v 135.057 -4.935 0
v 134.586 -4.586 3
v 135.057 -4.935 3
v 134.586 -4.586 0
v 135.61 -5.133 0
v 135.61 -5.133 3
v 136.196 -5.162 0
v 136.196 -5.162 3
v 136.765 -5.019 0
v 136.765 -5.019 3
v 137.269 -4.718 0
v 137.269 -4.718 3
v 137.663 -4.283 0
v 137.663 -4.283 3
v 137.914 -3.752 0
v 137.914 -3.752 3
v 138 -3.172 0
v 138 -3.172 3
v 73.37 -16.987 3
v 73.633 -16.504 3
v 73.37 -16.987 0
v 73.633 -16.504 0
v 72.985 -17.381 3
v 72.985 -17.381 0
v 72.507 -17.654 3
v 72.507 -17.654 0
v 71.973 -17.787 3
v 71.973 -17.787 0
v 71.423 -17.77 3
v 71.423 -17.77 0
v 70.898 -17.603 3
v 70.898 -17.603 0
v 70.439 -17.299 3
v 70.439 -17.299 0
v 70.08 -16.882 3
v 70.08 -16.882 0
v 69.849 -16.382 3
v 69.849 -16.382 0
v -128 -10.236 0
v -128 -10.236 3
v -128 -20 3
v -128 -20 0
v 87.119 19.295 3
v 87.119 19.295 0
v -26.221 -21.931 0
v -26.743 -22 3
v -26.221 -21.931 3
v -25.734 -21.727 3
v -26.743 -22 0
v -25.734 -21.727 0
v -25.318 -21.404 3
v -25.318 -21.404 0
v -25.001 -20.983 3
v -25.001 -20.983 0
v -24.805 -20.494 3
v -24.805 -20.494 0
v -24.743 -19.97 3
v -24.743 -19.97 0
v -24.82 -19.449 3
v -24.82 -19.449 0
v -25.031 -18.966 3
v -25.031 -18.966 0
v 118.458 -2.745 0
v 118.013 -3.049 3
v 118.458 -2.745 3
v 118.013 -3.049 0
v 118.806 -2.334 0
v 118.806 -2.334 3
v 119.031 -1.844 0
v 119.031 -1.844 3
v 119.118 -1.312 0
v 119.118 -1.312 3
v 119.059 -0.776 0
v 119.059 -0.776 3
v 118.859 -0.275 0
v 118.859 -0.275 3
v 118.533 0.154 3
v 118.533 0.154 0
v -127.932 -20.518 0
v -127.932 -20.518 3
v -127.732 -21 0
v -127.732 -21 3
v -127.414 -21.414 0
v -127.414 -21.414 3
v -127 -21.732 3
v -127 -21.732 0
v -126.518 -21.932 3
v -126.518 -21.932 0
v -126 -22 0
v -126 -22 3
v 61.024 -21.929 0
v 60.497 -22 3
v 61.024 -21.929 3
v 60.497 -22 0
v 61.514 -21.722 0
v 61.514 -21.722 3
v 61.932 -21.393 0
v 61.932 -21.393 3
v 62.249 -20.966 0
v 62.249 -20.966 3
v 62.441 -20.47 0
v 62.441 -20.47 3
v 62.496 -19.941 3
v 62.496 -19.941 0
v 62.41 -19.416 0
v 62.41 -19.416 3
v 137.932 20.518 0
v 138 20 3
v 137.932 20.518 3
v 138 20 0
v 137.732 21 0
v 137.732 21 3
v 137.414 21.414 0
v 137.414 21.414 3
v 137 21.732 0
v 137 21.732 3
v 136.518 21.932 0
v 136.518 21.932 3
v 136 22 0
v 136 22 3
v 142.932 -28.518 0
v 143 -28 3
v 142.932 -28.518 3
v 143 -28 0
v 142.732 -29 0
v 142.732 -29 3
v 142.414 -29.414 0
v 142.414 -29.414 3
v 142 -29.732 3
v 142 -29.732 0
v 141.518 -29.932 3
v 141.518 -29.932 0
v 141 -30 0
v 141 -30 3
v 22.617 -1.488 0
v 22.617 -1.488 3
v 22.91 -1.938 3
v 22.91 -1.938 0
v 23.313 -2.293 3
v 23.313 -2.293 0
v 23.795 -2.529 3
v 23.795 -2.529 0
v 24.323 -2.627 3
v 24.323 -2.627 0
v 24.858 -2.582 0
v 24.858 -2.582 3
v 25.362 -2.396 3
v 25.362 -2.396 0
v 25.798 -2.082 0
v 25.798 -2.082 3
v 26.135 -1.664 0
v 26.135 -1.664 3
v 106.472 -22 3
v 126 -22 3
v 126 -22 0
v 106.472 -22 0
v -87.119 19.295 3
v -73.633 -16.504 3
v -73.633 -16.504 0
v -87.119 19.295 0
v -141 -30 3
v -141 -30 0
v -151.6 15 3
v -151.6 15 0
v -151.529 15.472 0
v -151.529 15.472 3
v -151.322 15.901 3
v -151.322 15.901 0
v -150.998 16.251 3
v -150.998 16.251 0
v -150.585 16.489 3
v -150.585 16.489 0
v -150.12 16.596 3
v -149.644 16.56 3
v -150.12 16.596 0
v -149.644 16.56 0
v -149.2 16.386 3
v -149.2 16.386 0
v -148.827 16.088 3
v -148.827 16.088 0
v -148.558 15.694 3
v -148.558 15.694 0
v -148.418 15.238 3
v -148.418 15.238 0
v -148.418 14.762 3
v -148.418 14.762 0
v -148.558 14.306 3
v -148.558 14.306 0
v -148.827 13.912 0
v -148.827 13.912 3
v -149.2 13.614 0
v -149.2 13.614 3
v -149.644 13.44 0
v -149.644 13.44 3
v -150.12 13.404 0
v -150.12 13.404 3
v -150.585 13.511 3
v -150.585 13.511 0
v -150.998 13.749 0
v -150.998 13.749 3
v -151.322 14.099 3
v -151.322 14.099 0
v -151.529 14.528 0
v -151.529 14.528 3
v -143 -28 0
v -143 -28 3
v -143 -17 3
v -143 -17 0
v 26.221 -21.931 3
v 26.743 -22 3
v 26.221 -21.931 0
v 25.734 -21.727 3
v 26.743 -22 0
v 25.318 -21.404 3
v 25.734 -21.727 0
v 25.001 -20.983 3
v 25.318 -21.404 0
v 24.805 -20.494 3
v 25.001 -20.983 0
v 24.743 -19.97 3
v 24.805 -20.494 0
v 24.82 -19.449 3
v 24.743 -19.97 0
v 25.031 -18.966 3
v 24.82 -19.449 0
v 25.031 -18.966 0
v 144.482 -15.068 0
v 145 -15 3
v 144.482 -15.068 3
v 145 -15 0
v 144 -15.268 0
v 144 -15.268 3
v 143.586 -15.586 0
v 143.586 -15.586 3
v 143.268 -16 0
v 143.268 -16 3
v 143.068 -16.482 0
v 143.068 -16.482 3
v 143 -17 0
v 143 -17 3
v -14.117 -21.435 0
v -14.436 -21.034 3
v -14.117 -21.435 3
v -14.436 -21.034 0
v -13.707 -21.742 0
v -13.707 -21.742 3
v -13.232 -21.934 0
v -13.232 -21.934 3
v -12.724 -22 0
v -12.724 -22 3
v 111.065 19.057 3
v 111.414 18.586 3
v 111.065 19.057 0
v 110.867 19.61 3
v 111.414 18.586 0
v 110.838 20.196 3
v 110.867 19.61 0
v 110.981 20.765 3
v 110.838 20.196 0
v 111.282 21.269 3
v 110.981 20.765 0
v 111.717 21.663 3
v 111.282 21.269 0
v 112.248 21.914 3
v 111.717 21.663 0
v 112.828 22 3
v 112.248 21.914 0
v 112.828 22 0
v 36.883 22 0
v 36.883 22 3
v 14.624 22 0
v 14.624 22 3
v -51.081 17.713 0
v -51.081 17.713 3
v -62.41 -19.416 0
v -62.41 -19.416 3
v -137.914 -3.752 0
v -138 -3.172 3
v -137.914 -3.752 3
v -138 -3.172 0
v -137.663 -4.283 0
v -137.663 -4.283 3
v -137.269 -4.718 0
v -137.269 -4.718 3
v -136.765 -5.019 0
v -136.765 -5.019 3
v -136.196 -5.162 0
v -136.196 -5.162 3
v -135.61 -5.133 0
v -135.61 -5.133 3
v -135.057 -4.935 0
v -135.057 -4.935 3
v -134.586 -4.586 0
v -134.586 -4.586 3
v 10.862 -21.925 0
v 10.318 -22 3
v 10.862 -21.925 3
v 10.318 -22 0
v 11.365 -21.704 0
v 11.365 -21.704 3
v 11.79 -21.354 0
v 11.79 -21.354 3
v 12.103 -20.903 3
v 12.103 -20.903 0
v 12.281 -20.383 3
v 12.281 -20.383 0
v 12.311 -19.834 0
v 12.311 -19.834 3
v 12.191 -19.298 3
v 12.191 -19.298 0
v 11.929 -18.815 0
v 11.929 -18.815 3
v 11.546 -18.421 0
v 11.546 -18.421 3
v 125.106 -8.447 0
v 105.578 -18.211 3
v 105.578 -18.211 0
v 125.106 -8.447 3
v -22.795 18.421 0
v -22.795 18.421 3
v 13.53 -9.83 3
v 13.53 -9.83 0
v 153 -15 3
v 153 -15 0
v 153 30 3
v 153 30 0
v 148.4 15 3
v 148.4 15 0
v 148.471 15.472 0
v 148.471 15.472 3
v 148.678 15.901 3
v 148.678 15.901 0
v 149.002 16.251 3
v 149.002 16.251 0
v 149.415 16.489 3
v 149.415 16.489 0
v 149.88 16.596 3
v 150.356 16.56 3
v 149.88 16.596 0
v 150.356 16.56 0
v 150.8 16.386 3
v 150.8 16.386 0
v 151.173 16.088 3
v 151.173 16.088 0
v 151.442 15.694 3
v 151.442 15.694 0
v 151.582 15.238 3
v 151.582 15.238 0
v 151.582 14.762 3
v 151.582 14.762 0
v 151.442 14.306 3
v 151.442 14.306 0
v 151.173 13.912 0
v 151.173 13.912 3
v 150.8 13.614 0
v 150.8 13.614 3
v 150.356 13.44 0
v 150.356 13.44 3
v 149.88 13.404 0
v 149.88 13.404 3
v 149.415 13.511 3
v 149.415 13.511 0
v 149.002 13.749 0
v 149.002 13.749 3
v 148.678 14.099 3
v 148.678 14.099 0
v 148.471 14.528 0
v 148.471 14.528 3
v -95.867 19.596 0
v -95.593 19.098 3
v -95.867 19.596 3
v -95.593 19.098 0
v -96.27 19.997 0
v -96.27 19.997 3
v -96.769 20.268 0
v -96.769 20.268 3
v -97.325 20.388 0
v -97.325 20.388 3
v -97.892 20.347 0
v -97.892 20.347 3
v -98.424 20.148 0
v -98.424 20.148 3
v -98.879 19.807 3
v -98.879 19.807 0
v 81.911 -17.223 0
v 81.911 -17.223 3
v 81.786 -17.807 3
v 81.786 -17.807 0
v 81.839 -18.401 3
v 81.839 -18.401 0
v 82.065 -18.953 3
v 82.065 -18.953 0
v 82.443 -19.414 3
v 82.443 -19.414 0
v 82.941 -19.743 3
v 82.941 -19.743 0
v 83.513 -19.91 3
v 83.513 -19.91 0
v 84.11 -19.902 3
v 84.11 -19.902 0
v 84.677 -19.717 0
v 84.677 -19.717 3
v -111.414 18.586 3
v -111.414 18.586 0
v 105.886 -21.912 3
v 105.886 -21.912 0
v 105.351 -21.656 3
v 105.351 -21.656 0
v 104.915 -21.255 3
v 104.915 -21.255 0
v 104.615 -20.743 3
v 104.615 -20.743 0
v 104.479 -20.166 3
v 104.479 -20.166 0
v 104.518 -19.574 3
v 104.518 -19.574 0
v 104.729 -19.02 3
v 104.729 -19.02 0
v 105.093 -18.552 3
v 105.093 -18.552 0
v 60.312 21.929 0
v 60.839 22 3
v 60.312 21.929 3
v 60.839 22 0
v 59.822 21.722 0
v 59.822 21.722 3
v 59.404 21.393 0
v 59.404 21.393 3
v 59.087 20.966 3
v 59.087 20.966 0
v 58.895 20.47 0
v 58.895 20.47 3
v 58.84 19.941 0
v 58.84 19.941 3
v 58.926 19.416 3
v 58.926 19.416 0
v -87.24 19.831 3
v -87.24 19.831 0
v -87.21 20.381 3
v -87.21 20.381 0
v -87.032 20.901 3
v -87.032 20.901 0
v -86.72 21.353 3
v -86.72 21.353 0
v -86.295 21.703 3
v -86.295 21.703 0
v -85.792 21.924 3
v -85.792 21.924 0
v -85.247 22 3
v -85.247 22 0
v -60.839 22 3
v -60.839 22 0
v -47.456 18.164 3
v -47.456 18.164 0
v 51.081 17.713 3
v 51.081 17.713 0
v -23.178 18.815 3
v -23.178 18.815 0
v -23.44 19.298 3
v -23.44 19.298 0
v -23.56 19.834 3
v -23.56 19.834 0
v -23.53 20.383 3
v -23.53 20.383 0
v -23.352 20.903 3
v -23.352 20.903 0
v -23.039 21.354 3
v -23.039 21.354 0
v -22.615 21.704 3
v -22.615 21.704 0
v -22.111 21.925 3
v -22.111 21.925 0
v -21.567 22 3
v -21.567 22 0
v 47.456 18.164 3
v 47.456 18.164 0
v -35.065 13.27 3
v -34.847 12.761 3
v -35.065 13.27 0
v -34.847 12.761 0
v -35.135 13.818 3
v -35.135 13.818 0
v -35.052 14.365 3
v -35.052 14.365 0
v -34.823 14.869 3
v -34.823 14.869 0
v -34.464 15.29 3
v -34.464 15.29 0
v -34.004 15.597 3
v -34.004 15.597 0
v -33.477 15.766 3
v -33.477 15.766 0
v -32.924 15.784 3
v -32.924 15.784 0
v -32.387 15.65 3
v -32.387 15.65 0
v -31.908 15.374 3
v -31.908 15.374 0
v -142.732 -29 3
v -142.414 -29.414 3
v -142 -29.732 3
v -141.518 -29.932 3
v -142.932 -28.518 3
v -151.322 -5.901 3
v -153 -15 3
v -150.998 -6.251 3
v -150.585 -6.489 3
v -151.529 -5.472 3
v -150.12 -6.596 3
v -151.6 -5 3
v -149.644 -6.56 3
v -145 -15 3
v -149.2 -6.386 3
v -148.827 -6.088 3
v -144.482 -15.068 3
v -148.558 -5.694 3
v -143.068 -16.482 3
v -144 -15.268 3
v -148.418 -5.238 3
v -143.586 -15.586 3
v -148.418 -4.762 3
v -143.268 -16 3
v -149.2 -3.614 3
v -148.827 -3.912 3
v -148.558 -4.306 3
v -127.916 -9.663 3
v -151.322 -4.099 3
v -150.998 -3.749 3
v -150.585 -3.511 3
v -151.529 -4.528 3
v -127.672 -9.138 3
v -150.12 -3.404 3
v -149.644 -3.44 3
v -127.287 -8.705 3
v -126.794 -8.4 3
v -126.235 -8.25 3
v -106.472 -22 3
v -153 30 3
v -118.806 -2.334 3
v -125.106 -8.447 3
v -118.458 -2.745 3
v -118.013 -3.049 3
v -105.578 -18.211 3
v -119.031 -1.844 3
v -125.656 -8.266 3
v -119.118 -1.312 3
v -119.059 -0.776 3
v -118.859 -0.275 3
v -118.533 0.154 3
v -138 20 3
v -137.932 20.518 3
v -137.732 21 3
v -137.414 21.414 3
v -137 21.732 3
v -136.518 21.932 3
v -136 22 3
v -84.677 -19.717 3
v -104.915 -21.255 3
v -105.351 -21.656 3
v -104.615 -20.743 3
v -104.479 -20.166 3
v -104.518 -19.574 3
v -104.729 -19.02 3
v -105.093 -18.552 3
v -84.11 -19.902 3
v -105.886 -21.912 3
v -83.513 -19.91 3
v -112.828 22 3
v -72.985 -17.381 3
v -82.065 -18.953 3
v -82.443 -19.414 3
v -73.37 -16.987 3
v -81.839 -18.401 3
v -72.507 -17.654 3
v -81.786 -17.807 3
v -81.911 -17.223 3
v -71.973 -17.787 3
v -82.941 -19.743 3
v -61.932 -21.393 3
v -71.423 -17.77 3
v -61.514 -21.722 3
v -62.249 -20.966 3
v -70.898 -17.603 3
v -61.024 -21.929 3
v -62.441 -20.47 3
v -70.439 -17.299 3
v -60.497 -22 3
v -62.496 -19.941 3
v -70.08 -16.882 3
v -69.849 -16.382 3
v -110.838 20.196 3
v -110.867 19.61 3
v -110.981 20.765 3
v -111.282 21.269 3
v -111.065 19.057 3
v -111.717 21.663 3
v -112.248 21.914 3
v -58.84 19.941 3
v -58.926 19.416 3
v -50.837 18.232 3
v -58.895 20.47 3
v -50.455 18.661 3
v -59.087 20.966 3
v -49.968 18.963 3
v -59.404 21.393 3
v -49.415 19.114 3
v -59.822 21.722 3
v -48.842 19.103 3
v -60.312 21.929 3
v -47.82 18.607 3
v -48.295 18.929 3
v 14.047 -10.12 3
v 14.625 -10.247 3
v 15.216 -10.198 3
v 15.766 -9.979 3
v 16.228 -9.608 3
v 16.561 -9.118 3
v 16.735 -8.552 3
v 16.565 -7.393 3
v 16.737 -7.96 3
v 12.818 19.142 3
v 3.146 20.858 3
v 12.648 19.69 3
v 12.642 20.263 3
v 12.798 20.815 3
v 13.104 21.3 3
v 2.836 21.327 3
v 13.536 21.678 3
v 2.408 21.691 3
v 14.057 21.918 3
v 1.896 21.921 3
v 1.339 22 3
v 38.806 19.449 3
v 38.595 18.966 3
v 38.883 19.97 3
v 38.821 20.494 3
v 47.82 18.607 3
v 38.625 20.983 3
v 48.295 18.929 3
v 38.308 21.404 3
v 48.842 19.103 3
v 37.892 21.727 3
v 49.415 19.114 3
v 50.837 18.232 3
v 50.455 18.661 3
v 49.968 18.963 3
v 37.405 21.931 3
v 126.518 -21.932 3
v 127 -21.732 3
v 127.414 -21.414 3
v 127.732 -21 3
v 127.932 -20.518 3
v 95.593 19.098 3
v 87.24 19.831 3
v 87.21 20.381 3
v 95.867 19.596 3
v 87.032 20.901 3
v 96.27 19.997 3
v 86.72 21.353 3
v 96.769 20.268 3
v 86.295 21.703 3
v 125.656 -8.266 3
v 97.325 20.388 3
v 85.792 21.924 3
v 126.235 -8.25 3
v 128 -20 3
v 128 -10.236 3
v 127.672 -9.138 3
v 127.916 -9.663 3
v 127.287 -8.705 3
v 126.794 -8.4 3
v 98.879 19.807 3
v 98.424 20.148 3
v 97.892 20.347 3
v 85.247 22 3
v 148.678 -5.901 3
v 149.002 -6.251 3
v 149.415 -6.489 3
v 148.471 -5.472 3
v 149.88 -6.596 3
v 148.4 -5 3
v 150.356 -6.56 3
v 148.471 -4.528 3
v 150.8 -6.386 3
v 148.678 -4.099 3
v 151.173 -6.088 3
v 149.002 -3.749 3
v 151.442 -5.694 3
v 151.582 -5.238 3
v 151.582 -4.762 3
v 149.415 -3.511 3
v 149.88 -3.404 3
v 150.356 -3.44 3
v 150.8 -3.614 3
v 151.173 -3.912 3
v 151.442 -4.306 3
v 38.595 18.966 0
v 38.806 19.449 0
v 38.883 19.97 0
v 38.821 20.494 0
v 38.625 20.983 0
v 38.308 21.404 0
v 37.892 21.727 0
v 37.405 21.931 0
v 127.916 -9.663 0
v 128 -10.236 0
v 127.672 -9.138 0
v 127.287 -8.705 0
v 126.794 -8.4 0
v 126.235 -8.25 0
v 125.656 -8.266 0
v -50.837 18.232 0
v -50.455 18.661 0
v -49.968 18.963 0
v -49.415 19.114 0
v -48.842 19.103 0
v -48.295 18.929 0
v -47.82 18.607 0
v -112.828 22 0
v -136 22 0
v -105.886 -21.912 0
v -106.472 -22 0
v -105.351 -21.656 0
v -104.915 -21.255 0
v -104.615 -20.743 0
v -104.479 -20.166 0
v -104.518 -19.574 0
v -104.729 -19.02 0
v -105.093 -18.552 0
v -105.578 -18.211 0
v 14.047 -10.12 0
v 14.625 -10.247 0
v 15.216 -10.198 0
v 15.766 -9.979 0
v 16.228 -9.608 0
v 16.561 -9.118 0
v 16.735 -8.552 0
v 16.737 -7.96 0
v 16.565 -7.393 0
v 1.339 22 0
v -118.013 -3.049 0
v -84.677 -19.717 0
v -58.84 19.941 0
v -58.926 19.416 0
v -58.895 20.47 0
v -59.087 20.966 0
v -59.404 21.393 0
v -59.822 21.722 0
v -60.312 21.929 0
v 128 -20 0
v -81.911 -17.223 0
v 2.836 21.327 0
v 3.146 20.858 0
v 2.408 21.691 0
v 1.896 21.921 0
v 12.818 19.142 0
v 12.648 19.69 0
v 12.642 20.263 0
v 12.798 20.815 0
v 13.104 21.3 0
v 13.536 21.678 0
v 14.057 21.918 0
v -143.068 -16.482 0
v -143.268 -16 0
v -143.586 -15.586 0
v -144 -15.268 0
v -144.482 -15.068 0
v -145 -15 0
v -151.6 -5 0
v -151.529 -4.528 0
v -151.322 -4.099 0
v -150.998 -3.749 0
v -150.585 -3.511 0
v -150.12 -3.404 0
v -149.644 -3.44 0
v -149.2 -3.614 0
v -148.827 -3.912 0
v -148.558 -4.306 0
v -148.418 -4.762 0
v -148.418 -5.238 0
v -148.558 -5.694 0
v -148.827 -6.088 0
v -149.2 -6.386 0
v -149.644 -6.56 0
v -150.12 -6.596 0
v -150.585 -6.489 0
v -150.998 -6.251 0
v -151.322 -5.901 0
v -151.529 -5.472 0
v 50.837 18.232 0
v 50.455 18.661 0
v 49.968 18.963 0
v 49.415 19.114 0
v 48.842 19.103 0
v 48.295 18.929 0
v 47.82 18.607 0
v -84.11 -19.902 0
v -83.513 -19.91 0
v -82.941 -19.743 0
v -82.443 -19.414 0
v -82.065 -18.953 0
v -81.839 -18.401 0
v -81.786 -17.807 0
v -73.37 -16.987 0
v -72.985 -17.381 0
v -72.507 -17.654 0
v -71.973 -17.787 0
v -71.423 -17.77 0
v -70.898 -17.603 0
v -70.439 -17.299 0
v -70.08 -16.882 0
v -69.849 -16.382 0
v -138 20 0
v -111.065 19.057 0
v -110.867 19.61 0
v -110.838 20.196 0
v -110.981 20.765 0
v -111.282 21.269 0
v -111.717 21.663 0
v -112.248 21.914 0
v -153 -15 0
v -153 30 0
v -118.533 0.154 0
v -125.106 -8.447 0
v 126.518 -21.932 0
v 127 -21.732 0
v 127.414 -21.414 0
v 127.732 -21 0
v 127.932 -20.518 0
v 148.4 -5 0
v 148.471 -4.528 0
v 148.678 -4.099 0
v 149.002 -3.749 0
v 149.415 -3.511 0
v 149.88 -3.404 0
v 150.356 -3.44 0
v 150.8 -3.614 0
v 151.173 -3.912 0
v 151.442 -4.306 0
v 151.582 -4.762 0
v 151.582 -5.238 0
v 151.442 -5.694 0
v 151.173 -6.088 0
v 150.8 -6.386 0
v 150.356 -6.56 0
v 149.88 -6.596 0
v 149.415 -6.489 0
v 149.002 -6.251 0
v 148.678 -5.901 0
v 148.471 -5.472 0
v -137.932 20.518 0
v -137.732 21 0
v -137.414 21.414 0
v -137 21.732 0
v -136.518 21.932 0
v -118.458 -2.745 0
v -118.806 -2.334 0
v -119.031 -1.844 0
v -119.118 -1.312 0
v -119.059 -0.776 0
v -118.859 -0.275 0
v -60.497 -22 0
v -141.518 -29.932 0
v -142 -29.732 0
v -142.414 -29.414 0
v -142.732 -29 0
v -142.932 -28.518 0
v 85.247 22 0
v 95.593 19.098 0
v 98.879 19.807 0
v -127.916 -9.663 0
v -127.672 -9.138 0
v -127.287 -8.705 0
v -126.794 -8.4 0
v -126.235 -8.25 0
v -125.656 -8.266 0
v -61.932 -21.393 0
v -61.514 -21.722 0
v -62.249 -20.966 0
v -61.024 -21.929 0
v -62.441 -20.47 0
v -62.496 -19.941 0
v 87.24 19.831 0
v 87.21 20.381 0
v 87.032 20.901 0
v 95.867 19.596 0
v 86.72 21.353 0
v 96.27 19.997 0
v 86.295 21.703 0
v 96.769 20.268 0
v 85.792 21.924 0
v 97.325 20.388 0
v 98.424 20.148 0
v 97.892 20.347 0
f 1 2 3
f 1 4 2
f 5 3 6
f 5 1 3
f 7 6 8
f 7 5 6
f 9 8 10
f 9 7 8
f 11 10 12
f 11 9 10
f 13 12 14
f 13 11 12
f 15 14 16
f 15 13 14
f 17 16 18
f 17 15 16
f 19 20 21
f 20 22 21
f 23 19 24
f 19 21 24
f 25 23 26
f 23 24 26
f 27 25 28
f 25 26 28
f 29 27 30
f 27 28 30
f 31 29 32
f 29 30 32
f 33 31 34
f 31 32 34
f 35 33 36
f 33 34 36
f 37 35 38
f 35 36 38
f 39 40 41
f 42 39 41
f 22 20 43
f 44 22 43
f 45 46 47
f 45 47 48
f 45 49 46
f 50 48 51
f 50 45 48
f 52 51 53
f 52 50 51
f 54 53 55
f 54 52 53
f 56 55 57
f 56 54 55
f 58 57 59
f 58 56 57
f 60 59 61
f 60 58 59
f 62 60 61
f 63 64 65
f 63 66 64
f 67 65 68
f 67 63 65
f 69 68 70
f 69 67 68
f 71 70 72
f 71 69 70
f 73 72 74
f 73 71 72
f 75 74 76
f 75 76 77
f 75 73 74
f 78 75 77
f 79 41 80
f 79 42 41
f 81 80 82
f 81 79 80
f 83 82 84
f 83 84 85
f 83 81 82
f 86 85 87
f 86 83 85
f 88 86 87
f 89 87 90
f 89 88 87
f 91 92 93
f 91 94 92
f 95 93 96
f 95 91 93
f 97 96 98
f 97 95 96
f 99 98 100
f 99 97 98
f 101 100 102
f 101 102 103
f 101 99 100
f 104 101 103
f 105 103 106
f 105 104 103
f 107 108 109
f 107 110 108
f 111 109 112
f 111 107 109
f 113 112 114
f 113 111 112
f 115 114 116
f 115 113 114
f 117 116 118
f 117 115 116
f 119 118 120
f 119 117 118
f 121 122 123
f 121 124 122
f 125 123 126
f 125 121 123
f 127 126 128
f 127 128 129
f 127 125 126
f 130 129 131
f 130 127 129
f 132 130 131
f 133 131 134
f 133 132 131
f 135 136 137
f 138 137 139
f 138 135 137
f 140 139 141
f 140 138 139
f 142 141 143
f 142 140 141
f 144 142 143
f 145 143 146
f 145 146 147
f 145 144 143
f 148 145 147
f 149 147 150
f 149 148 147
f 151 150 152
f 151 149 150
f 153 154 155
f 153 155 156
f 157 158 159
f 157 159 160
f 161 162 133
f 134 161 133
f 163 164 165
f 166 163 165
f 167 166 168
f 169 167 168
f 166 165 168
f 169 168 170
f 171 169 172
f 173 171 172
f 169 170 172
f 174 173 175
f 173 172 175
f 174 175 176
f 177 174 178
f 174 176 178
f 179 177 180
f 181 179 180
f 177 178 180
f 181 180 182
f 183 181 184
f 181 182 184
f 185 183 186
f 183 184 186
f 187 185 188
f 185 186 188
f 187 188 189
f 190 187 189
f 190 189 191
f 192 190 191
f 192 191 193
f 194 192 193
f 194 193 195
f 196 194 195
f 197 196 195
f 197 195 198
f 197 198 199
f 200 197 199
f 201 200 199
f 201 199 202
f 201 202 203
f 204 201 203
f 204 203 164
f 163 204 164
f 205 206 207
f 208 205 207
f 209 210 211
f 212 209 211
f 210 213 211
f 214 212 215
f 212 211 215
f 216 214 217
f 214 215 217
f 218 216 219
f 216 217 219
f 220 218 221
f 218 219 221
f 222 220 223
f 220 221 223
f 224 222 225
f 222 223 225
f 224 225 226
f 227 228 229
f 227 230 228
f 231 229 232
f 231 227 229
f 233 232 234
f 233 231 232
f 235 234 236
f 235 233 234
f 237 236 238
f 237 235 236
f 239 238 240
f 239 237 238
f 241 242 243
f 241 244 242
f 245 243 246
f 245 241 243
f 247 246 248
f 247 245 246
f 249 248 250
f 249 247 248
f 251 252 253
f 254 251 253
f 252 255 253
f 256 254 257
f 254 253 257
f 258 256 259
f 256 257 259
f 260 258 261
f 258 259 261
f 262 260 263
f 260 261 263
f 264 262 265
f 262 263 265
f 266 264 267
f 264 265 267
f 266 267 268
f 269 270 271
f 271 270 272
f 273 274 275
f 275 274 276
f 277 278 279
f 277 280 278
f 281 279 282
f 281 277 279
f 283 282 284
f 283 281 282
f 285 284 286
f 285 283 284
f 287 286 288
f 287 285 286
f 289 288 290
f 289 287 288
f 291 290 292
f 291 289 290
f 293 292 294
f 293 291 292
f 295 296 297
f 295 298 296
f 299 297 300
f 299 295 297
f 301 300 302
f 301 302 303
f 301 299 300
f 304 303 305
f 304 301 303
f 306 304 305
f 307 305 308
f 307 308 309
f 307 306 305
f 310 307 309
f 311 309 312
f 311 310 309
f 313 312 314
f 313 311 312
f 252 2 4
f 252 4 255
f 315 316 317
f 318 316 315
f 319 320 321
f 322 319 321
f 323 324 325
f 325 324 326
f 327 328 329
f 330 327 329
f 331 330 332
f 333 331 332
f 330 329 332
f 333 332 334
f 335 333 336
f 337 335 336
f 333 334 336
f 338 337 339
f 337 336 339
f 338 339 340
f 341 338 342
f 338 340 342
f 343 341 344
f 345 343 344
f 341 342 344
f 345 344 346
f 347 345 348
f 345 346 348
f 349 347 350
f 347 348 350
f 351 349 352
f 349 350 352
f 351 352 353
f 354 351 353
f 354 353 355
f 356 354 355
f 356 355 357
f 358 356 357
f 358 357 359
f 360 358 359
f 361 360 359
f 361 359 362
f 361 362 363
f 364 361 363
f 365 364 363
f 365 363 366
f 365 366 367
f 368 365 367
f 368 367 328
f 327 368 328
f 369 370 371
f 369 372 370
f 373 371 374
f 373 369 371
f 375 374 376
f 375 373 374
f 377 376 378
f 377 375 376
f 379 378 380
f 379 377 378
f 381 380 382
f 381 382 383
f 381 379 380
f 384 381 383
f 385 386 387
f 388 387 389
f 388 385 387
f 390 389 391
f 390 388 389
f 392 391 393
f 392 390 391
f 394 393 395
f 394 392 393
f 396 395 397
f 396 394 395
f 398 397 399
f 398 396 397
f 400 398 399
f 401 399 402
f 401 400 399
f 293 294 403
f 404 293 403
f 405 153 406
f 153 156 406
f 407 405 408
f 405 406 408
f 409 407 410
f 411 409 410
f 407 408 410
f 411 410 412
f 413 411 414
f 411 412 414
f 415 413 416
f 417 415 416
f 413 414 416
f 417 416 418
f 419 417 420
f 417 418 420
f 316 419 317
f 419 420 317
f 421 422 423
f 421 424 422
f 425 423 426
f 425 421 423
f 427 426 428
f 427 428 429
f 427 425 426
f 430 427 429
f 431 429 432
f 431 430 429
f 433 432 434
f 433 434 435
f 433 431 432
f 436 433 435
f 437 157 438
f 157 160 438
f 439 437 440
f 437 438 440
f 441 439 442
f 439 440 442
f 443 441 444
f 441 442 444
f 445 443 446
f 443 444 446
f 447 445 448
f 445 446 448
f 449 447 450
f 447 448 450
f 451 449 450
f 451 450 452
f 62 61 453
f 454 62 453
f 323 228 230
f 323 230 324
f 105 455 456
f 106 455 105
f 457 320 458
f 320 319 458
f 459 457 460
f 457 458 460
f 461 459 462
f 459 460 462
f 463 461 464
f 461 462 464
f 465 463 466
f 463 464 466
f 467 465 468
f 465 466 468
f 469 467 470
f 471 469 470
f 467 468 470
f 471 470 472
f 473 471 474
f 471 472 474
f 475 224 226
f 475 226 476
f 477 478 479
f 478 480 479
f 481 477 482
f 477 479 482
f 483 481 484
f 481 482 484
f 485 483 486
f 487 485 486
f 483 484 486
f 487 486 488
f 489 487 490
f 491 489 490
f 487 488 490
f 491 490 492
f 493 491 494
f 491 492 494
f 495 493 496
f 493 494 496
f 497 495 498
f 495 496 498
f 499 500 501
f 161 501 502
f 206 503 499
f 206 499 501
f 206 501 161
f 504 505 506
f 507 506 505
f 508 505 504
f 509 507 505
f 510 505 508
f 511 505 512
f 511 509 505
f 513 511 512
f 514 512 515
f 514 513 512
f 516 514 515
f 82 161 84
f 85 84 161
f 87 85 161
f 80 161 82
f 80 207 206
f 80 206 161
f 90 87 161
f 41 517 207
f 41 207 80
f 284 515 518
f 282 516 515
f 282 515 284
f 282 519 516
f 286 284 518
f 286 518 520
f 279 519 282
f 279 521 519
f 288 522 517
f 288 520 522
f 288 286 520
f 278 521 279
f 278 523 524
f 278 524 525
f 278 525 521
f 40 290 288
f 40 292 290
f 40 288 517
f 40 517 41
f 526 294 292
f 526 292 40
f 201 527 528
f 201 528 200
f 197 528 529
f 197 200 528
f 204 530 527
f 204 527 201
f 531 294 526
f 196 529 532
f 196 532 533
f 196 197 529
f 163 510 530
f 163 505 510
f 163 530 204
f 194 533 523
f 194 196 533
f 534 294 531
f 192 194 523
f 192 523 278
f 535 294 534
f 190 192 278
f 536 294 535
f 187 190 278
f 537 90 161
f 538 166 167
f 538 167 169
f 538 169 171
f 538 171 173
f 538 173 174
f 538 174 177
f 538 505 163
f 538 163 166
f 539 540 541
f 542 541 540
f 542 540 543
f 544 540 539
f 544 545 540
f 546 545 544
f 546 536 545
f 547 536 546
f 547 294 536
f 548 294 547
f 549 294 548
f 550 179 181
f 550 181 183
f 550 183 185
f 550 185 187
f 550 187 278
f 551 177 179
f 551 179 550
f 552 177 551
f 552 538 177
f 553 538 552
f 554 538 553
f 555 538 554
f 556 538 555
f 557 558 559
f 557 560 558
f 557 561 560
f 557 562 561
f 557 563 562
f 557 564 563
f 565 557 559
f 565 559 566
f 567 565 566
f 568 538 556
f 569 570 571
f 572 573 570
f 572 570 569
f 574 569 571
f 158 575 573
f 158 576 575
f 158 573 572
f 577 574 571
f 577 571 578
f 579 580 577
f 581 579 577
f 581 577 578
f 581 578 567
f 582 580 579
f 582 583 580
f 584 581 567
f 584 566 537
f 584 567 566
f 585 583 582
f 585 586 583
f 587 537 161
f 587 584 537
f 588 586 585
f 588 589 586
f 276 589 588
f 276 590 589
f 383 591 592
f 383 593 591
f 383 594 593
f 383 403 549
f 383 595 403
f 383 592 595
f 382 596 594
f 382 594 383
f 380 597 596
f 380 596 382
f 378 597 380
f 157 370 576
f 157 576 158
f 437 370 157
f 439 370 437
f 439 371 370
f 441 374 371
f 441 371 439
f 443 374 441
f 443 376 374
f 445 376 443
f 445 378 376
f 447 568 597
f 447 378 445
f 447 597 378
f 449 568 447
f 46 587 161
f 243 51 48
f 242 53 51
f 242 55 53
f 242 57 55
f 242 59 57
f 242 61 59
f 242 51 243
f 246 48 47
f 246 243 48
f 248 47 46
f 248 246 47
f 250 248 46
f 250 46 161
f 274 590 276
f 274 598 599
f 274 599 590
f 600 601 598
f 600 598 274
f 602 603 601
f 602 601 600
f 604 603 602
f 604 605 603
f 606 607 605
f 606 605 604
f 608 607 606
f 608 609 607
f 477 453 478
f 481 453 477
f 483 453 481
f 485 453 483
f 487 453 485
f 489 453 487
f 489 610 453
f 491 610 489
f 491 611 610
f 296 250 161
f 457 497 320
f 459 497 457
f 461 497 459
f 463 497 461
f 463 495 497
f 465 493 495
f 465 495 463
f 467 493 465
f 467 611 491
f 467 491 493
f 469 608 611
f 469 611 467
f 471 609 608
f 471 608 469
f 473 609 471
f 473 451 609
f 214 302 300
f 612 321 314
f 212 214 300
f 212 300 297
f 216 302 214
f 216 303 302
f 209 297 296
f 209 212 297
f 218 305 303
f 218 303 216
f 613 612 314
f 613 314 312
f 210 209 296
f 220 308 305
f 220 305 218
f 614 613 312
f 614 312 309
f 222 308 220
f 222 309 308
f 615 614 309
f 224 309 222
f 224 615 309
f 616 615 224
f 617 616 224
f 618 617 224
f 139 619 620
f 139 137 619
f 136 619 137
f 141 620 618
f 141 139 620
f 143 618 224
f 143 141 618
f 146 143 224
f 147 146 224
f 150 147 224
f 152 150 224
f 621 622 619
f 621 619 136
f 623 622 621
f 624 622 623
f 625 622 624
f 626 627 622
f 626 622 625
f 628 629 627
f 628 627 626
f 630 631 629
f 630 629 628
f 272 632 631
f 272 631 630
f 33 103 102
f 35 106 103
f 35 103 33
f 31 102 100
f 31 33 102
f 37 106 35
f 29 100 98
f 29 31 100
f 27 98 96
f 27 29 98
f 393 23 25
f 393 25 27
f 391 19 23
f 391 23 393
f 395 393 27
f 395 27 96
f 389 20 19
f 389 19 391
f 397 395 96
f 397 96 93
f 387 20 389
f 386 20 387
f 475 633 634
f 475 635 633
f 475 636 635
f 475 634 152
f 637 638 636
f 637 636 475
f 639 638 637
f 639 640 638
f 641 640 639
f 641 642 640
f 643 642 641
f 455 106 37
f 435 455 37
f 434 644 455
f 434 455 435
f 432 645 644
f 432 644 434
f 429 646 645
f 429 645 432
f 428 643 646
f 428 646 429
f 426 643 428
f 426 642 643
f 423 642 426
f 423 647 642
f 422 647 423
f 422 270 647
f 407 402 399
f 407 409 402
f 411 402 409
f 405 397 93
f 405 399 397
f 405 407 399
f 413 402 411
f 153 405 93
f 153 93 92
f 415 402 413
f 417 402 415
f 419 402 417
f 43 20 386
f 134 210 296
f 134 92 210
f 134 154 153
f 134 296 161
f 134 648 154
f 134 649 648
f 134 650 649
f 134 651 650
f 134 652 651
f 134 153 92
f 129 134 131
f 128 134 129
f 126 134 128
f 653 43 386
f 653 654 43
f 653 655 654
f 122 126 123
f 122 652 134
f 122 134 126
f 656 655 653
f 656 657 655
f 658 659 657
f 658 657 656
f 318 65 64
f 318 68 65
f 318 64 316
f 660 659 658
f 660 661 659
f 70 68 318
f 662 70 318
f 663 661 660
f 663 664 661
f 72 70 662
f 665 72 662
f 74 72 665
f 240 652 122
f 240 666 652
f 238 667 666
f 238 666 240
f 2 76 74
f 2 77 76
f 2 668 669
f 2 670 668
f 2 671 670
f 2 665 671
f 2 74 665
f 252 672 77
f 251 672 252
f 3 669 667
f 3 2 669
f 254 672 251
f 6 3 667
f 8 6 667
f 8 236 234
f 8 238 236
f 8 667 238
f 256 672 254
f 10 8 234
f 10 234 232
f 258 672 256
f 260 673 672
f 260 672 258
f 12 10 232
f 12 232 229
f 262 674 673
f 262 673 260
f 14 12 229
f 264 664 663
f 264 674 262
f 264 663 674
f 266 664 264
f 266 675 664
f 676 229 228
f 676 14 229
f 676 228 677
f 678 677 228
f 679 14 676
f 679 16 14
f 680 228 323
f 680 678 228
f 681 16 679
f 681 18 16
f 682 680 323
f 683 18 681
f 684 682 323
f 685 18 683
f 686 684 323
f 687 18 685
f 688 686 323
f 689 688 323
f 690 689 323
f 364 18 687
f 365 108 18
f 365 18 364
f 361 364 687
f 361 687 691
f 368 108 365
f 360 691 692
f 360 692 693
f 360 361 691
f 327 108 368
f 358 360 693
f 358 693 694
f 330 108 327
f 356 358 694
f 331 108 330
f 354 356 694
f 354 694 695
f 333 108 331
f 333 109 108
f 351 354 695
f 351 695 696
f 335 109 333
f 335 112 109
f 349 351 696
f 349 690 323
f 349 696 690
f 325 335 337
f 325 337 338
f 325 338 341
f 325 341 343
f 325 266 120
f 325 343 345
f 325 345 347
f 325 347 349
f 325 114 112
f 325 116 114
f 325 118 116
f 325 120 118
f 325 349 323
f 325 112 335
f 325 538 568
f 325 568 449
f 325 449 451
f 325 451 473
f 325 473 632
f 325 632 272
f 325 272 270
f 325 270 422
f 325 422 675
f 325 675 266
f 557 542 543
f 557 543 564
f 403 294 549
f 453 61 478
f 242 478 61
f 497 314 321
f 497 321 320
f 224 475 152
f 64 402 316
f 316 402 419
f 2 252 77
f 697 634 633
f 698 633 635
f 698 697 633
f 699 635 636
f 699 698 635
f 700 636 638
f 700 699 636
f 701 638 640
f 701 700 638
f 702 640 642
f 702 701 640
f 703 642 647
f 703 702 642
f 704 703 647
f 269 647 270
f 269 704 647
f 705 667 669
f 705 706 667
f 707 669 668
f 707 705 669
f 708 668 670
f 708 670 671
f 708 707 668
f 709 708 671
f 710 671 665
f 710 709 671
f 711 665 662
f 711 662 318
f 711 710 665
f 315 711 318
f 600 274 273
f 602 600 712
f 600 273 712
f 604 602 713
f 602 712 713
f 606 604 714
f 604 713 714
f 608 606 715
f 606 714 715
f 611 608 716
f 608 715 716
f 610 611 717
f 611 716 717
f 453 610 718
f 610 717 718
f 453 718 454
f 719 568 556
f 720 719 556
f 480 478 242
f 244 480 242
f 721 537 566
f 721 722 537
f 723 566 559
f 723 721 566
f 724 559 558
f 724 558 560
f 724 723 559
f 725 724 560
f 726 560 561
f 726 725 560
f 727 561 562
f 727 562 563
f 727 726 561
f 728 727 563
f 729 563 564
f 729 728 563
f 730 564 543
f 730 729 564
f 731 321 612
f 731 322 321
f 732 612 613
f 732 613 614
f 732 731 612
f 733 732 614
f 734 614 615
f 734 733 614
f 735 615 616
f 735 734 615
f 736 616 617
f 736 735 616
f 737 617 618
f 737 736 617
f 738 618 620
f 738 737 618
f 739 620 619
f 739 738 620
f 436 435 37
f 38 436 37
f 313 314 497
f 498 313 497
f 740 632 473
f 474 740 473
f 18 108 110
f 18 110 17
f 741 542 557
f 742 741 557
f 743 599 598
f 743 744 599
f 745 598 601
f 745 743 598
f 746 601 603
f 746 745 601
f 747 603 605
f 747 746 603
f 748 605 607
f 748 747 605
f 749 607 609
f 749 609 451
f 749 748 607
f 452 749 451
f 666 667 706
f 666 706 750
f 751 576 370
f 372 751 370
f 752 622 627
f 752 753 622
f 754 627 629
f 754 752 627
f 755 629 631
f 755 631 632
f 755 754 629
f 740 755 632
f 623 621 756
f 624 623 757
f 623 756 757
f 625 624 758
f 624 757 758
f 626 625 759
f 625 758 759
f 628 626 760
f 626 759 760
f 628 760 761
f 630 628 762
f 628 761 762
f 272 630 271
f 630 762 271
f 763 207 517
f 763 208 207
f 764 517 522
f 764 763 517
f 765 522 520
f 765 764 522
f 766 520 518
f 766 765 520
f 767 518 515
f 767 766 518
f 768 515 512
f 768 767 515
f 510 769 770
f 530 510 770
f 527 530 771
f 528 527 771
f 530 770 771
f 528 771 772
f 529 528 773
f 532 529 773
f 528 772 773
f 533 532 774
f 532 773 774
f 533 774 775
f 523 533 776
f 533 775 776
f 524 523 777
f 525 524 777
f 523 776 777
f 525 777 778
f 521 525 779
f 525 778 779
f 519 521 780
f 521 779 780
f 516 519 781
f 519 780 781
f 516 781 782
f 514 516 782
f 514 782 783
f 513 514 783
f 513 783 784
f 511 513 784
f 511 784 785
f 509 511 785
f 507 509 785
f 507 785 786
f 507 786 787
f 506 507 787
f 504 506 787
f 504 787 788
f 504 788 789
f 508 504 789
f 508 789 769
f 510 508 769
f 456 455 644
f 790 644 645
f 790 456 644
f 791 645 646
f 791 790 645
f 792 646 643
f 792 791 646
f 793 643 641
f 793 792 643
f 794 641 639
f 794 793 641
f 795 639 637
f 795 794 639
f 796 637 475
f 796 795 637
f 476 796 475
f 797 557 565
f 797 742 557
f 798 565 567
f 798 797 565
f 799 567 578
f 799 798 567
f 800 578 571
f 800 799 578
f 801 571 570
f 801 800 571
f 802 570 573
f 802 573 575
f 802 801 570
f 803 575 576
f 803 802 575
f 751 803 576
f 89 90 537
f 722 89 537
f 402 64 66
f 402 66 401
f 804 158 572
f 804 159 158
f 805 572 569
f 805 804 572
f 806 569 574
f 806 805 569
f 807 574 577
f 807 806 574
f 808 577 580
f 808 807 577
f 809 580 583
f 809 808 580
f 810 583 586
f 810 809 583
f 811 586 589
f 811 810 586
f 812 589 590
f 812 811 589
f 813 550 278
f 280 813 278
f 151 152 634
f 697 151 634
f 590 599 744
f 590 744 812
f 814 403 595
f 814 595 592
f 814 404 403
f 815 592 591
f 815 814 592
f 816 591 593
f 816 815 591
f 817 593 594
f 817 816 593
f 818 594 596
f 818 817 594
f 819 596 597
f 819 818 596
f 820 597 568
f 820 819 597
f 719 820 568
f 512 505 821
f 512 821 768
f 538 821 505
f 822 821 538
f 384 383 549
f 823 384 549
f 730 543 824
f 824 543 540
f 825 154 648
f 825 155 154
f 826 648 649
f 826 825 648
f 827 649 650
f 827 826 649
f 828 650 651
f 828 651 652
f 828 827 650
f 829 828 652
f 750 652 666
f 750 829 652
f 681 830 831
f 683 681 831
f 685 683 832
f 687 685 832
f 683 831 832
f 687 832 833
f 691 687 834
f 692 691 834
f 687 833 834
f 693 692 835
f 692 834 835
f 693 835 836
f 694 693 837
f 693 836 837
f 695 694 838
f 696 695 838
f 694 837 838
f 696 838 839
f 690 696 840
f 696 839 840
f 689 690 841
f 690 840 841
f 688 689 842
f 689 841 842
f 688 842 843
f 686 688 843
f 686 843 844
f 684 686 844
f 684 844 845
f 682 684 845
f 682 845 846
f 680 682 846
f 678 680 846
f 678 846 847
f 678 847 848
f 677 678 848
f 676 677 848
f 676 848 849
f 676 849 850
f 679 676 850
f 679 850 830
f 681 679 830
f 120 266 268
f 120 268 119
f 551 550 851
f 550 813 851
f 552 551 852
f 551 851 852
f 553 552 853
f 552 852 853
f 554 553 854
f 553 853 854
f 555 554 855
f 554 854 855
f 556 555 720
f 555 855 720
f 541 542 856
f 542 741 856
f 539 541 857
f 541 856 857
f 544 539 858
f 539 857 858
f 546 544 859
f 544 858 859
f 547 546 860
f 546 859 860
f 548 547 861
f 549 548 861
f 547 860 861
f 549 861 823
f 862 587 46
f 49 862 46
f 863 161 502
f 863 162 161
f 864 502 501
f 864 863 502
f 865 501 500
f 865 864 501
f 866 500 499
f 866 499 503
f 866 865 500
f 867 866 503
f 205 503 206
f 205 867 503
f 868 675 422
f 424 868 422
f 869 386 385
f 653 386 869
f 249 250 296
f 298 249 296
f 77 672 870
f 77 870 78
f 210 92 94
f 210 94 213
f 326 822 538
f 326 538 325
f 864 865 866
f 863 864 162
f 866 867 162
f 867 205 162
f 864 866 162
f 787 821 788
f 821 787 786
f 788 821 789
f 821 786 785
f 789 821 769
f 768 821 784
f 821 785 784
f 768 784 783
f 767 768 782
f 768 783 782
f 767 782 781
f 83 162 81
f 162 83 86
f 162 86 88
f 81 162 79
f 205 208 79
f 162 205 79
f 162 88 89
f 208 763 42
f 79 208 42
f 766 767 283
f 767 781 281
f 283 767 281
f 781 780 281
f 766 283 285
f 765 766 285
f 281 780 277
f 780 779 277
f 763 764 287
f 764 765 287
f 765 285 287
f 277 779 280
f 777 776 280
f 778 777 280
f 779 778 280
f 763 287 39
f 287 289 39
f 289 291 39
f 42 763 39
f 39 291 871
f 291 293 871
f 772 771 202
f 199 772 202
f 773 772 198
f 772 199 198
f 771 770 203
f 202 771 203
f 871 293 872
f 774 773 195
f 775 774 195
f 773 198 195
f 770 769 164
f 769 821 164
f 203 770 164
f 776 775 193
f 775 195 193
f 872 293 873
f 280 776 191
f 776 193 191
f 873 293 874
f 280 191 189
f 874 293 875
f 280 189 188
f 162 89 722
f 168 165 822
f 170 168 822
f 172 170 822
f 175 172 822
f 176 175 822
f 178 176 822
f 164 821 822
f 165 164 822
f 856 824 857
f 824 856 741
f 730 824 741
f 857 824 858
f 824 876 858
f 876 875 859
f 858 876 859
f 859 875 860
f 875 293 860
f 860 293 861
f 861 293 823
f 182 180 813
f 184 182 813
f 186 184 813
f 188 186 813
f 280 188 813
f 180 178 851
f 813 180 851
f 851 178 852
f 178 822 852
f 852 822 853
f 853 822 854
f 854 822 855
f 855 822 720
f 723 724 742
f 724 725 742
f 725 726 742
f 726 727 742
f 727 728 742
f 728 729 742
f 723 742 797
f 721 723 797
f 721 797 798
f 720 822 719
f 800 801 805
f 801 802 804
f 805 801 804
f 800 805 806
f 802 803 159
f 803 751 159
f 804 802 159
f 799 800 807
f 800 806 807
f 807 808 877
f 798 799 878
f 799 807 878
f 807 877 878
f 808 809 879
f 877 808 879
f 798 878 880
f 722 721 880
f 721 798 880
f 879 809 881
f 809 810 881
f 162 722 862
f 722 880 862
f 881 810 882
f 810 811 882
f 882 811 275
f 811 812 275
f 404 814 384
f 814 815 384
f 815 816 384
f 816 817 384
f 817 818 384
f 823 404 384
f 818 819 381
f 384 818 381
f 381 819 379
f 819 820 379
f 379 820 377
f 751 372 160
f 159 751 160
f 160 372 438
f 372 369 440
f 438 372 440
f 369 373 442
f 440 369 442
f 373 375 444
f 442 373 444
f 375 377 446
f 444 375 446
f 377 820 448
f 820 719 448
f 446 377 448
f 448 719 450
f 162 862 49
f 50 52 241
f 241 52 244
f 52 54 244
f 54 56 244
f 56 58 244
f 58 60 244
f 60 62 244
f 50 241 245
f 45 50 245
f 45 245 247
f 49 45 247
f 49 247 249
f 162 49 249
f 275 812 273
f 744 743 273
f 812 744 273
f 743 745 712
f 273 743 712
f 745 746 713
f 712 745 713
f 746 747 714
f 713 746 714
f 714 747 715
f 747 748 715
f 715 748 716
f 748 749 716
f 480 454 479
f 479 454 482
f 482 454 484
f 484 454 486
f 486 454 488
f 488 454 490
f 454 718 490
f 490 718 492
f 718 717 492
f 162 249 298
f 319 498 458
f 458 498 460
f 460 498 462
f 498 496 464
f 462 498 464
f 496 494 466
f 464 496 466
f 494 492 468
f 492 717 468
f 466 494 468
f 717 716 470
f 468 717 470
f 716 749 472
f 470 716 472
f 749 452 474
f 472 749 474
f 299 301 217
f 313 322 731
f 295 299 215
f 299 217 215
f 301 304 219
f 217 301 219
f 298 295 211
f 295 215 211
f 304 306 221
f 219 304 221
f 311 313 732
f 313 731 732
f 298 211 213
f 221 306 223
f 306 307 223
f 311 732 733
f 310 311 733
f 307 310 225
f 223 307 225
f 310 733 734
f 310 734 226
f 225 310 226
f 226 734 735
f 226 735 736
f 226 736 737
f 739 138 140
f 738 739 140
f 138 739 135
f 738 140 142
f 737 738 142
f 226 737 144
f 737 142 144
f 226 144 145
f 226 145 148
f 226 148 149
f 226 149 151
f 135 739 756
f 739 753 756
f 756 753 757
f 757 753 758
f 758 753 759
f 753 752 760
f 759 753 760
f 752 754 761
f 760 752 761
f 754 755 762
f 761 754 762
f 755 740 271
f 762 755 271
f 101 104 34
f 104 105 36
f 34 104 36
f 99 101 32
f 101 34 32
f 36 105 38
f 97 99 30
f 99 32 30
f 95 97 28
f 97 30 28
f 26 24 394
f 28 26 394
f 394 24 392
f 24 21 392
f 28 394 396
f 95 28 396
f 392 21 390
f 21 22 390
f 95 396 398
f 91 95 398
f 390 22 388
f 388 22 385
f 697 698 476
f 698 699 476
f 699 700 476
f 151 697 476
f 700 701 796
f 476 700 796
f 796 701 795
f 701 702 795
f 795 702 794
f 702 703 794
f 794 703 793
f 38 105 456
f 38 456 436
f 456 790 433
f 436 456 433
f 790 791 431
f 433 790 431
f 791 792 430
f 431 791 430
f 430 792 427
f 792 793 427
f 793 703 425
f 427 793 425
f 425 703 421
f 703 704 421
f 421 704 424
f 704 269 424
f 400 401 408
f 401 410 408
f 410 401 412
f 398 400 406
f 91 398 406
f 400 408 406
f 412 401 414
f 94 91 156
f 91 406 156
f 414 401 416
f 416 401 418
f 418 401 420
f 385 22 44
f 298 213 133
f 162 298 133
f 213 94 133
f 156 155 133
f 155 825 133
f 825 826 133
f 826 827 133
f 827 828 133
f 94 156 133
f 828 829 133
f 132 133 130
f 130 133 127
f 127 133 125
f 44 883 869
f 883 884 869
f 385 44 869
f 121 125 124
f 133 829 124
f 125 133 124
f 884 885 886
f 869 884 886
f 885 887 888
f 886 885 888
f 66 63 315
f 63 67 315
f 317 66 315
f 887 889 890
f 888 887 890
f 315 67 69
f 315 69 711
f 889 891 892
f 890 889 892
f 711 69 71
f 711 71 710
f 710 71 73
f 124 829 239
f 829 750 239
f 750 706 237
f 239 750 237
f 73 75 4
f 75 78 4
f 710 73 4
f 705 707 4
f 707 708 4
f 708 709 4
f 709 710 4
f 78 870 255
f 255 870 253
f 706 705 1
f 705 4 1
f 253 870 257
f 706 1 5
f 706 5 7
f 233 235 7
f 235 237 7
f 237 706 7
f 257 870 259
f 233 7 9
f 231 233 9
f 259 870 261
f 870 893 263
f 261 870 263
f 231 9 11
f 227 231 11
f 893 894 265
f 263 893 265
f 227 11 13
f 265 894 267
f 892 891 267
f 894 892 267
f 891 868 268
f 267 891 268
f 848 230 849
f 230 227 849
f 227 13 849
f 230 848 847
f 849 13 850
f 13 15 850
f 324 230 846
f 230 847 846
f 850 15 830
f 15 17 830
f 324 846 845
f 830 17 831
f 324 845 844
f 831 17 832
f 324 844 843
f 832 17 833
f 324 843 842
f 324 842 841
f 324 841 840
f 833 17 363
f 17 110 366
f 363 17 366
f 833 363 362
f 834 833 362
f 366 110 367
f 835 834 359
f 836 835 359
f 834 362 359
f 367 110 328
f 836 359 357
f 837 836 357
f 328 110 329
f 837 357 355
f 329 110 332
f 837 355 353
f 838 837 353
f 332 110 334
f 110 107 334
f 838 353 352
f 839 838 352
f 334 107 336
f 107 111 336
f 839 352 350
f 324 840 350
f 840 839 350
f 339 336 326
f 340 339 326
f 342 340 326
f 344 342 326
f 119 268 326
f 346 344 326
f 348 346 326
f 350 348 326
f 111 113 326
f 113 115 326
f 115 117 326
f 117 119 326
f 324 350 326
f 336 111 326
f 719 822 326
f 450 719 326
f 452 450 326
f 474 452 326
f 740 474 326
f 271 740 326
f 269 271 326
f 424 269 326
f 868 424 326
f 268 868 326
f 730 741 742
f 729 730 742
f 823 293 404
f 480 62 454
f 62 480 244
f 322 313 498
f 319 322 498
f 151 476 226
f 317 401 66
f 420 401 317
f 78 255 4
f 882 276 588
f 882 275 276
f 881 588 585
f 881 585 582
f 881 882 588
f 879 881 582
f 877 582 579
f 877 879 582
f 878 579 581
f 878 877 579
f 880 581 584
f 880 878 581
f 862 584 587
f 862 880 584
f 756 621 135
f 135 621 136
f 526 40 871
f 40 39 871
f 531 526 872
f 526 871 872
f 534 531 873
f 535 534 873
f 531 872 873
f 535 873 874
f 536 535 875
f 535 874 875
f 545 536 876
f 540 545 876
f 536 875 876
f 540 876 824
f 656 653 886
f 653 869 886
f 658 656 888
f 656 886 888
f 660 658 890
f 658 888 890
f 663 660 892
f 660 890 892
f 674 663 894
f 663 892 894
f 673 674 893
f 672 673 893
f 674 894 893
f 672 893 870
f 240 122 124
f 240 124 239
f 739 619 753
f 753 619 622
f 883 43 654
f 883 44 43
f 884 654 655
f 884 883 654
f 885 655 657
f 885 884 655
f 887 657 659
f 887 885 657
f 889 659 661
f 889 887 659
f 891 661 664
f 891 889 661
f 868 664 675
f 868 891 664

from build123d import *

# Parameters (mm, degrees)
SKETCH_1_W              = 306
SKETCH_1_H              = 60
EXTRUDE_1_DEPTH         = 3
HOLE_WIZARD_3_2_3_2_1_D = 3.2
SKETCH_4_W              = 10
SKETCH_4_H              = 15
CUT_EXTRUDE_1_DEPTH     = 156.94229702
FILLET_1_R              = 2
FILLET_2_R              = 2


with BuildPart() as part:
    # 草图1 → 凸台-拉伸1 (new body)
    with BuildSketch(Plane.XY):
        Rectangle(SKETCH_1_W, SKETCH_1_H)
    extrude(amount=EXTRUDE_1_DEPTH)

    # Ø3.2 (3.2) 直径孔1 (through all)
    with Locations(Plane(origin=(-150, 15, 3), x_dir=(1, 0, 0), z_dir=(0, 0, 1))):
        with Locations((0, 0), (0, -20), (300, 0), (300, -20)):
            Hole(HOLE_WIZARD_3_2_3_2_1_D / 2)

    # 草图4 → 切除-拉伸1 (cut, through all)
    with BuildSketch(Plane.XY.offset(3)):
        Polygon((-138, 22), (-138, -8), (-108, 22), align=None)
        with Locations((-148, -22.5)):
            Rectangle(SKETCH_4_W, SKETCH_4_H)
        Polygon((-128, -7), (-128, -22), (-98, -22), align=None)
        Polygon((-120.494679727, -1.808388226), (-80.11145618, -22), (-96.686291501, 22), align=None)
        Polygon((-88.137500729, 22), (-58.137500729, 22), (-71.562665408, -22), align=None)
        Polygon((-49.773399859, 22), (-63.198564538, -22), (-23.198564538, -22), align=None)
        Polygon((23.198564538, -22), (49.773399859, 22), (63.198564538, -22), align=None)
        Polygon((71.562665408, -22), (88.137500729, 22), (58.137500729, 22), align=None)
        Polygon((96.686291501, 22), (120.494679727, -1.808388226), (80.11145618, -22), align=None)
        Polygon((98, -22), (128, -7), (128, -22), align=None)
        Polygon((108, 22), (138, 22), (138, -8), align=None)
        with Locations((148, -22.5)):
            Rectangle(SKETCH_4_W, SKETCH_4_H)
        Polygon((-40.427482162, 22), (-13.852646841, -22), (16.147353159, -22), align=None)
        Polygon((-27.396416938, 22), (20.1778764, -15), (2.603583062, 22), align=None)
        Polygon((11.460153437, 22), (24.21224704, -4.847592346), (40.427482162, 22), align=None)
    extrude(amount=-CUT_EXTRUDE_1_DEPTH, mode=Mode.SUBTRACT)

    # 圆角1
    fillet_1_edges = [part.edges().sort_by_distance(p)[0] for p in [
        (128, -22, 1.5),
        (98, -22, 1.5),
        (128, -7, 1.5),
        (138, -8, 1.5),
        (108, 22, 1.5),
        (138, 22, 1.5),
        (11.460153437, 22, 1.5),
        (40.427482162, 22, 1.5),
        (24.21224704, -4.847592346, 1.5),
        (-27.396416938, 22, 1.5),
        (2.603583062, 22, 1.5),
        (20.1778764, -15, 1.5),
        (-120.494679727, -1.808388226, 1.5),
        (-96.686291501, 22, 1.5),
        (-80.11145618, -22, 1.5),
        (-71.562665408, -22, 1.5),
        (-88.137500729, 22, 1.5),
        (-58.137500729, 22, 1.5),
        (-138, 22, 1.5),
        (-108, 22, 1.5),
        (-138, -8, 1.5),
        (-128, -7, 1.5),
        (-98, -22, 1.5),
        (-128, -22, 1.5),
        (71.562665408, -22, 1.5),
        (58.137500729, 22, 1.5),
        (88.137500729, 22, 1.5),
        (80.11145618, -22, 1.5),
        (96.686291501, 22, 1.5),
        (120.494679727, -1.808388226, 1.5),
        (63.198564538, -22, 1.5),
        (23.198564538, -22, 1.5),
        (49.773399859, 22, 1.5),
        (-49.773399859, 22, 1.5),
        (-23.198564538, -22, 1.5),
        (-63.198564538, -22, 1.5),
        (-40.427482162, 22, 1.5),
        (16.147353159, -22, 1.5),
        (-13.852646841, -22, 1.5),
    ]]
    fillet(fillet_1_edges, radius=FILLET_1_R)

    # 圆角2
    fillet_2_edges = [part.edges().sort_by_distance(p)[0] for p in [
        (-143, -15, 1.5),
        (-143, -30, 1.5),
        (143, -30, 1.5),
        (143, -15, 1.5),
    ]]
    fillet(fillet_2_edges, radius=FILLET_2_R)


solid = part.part
